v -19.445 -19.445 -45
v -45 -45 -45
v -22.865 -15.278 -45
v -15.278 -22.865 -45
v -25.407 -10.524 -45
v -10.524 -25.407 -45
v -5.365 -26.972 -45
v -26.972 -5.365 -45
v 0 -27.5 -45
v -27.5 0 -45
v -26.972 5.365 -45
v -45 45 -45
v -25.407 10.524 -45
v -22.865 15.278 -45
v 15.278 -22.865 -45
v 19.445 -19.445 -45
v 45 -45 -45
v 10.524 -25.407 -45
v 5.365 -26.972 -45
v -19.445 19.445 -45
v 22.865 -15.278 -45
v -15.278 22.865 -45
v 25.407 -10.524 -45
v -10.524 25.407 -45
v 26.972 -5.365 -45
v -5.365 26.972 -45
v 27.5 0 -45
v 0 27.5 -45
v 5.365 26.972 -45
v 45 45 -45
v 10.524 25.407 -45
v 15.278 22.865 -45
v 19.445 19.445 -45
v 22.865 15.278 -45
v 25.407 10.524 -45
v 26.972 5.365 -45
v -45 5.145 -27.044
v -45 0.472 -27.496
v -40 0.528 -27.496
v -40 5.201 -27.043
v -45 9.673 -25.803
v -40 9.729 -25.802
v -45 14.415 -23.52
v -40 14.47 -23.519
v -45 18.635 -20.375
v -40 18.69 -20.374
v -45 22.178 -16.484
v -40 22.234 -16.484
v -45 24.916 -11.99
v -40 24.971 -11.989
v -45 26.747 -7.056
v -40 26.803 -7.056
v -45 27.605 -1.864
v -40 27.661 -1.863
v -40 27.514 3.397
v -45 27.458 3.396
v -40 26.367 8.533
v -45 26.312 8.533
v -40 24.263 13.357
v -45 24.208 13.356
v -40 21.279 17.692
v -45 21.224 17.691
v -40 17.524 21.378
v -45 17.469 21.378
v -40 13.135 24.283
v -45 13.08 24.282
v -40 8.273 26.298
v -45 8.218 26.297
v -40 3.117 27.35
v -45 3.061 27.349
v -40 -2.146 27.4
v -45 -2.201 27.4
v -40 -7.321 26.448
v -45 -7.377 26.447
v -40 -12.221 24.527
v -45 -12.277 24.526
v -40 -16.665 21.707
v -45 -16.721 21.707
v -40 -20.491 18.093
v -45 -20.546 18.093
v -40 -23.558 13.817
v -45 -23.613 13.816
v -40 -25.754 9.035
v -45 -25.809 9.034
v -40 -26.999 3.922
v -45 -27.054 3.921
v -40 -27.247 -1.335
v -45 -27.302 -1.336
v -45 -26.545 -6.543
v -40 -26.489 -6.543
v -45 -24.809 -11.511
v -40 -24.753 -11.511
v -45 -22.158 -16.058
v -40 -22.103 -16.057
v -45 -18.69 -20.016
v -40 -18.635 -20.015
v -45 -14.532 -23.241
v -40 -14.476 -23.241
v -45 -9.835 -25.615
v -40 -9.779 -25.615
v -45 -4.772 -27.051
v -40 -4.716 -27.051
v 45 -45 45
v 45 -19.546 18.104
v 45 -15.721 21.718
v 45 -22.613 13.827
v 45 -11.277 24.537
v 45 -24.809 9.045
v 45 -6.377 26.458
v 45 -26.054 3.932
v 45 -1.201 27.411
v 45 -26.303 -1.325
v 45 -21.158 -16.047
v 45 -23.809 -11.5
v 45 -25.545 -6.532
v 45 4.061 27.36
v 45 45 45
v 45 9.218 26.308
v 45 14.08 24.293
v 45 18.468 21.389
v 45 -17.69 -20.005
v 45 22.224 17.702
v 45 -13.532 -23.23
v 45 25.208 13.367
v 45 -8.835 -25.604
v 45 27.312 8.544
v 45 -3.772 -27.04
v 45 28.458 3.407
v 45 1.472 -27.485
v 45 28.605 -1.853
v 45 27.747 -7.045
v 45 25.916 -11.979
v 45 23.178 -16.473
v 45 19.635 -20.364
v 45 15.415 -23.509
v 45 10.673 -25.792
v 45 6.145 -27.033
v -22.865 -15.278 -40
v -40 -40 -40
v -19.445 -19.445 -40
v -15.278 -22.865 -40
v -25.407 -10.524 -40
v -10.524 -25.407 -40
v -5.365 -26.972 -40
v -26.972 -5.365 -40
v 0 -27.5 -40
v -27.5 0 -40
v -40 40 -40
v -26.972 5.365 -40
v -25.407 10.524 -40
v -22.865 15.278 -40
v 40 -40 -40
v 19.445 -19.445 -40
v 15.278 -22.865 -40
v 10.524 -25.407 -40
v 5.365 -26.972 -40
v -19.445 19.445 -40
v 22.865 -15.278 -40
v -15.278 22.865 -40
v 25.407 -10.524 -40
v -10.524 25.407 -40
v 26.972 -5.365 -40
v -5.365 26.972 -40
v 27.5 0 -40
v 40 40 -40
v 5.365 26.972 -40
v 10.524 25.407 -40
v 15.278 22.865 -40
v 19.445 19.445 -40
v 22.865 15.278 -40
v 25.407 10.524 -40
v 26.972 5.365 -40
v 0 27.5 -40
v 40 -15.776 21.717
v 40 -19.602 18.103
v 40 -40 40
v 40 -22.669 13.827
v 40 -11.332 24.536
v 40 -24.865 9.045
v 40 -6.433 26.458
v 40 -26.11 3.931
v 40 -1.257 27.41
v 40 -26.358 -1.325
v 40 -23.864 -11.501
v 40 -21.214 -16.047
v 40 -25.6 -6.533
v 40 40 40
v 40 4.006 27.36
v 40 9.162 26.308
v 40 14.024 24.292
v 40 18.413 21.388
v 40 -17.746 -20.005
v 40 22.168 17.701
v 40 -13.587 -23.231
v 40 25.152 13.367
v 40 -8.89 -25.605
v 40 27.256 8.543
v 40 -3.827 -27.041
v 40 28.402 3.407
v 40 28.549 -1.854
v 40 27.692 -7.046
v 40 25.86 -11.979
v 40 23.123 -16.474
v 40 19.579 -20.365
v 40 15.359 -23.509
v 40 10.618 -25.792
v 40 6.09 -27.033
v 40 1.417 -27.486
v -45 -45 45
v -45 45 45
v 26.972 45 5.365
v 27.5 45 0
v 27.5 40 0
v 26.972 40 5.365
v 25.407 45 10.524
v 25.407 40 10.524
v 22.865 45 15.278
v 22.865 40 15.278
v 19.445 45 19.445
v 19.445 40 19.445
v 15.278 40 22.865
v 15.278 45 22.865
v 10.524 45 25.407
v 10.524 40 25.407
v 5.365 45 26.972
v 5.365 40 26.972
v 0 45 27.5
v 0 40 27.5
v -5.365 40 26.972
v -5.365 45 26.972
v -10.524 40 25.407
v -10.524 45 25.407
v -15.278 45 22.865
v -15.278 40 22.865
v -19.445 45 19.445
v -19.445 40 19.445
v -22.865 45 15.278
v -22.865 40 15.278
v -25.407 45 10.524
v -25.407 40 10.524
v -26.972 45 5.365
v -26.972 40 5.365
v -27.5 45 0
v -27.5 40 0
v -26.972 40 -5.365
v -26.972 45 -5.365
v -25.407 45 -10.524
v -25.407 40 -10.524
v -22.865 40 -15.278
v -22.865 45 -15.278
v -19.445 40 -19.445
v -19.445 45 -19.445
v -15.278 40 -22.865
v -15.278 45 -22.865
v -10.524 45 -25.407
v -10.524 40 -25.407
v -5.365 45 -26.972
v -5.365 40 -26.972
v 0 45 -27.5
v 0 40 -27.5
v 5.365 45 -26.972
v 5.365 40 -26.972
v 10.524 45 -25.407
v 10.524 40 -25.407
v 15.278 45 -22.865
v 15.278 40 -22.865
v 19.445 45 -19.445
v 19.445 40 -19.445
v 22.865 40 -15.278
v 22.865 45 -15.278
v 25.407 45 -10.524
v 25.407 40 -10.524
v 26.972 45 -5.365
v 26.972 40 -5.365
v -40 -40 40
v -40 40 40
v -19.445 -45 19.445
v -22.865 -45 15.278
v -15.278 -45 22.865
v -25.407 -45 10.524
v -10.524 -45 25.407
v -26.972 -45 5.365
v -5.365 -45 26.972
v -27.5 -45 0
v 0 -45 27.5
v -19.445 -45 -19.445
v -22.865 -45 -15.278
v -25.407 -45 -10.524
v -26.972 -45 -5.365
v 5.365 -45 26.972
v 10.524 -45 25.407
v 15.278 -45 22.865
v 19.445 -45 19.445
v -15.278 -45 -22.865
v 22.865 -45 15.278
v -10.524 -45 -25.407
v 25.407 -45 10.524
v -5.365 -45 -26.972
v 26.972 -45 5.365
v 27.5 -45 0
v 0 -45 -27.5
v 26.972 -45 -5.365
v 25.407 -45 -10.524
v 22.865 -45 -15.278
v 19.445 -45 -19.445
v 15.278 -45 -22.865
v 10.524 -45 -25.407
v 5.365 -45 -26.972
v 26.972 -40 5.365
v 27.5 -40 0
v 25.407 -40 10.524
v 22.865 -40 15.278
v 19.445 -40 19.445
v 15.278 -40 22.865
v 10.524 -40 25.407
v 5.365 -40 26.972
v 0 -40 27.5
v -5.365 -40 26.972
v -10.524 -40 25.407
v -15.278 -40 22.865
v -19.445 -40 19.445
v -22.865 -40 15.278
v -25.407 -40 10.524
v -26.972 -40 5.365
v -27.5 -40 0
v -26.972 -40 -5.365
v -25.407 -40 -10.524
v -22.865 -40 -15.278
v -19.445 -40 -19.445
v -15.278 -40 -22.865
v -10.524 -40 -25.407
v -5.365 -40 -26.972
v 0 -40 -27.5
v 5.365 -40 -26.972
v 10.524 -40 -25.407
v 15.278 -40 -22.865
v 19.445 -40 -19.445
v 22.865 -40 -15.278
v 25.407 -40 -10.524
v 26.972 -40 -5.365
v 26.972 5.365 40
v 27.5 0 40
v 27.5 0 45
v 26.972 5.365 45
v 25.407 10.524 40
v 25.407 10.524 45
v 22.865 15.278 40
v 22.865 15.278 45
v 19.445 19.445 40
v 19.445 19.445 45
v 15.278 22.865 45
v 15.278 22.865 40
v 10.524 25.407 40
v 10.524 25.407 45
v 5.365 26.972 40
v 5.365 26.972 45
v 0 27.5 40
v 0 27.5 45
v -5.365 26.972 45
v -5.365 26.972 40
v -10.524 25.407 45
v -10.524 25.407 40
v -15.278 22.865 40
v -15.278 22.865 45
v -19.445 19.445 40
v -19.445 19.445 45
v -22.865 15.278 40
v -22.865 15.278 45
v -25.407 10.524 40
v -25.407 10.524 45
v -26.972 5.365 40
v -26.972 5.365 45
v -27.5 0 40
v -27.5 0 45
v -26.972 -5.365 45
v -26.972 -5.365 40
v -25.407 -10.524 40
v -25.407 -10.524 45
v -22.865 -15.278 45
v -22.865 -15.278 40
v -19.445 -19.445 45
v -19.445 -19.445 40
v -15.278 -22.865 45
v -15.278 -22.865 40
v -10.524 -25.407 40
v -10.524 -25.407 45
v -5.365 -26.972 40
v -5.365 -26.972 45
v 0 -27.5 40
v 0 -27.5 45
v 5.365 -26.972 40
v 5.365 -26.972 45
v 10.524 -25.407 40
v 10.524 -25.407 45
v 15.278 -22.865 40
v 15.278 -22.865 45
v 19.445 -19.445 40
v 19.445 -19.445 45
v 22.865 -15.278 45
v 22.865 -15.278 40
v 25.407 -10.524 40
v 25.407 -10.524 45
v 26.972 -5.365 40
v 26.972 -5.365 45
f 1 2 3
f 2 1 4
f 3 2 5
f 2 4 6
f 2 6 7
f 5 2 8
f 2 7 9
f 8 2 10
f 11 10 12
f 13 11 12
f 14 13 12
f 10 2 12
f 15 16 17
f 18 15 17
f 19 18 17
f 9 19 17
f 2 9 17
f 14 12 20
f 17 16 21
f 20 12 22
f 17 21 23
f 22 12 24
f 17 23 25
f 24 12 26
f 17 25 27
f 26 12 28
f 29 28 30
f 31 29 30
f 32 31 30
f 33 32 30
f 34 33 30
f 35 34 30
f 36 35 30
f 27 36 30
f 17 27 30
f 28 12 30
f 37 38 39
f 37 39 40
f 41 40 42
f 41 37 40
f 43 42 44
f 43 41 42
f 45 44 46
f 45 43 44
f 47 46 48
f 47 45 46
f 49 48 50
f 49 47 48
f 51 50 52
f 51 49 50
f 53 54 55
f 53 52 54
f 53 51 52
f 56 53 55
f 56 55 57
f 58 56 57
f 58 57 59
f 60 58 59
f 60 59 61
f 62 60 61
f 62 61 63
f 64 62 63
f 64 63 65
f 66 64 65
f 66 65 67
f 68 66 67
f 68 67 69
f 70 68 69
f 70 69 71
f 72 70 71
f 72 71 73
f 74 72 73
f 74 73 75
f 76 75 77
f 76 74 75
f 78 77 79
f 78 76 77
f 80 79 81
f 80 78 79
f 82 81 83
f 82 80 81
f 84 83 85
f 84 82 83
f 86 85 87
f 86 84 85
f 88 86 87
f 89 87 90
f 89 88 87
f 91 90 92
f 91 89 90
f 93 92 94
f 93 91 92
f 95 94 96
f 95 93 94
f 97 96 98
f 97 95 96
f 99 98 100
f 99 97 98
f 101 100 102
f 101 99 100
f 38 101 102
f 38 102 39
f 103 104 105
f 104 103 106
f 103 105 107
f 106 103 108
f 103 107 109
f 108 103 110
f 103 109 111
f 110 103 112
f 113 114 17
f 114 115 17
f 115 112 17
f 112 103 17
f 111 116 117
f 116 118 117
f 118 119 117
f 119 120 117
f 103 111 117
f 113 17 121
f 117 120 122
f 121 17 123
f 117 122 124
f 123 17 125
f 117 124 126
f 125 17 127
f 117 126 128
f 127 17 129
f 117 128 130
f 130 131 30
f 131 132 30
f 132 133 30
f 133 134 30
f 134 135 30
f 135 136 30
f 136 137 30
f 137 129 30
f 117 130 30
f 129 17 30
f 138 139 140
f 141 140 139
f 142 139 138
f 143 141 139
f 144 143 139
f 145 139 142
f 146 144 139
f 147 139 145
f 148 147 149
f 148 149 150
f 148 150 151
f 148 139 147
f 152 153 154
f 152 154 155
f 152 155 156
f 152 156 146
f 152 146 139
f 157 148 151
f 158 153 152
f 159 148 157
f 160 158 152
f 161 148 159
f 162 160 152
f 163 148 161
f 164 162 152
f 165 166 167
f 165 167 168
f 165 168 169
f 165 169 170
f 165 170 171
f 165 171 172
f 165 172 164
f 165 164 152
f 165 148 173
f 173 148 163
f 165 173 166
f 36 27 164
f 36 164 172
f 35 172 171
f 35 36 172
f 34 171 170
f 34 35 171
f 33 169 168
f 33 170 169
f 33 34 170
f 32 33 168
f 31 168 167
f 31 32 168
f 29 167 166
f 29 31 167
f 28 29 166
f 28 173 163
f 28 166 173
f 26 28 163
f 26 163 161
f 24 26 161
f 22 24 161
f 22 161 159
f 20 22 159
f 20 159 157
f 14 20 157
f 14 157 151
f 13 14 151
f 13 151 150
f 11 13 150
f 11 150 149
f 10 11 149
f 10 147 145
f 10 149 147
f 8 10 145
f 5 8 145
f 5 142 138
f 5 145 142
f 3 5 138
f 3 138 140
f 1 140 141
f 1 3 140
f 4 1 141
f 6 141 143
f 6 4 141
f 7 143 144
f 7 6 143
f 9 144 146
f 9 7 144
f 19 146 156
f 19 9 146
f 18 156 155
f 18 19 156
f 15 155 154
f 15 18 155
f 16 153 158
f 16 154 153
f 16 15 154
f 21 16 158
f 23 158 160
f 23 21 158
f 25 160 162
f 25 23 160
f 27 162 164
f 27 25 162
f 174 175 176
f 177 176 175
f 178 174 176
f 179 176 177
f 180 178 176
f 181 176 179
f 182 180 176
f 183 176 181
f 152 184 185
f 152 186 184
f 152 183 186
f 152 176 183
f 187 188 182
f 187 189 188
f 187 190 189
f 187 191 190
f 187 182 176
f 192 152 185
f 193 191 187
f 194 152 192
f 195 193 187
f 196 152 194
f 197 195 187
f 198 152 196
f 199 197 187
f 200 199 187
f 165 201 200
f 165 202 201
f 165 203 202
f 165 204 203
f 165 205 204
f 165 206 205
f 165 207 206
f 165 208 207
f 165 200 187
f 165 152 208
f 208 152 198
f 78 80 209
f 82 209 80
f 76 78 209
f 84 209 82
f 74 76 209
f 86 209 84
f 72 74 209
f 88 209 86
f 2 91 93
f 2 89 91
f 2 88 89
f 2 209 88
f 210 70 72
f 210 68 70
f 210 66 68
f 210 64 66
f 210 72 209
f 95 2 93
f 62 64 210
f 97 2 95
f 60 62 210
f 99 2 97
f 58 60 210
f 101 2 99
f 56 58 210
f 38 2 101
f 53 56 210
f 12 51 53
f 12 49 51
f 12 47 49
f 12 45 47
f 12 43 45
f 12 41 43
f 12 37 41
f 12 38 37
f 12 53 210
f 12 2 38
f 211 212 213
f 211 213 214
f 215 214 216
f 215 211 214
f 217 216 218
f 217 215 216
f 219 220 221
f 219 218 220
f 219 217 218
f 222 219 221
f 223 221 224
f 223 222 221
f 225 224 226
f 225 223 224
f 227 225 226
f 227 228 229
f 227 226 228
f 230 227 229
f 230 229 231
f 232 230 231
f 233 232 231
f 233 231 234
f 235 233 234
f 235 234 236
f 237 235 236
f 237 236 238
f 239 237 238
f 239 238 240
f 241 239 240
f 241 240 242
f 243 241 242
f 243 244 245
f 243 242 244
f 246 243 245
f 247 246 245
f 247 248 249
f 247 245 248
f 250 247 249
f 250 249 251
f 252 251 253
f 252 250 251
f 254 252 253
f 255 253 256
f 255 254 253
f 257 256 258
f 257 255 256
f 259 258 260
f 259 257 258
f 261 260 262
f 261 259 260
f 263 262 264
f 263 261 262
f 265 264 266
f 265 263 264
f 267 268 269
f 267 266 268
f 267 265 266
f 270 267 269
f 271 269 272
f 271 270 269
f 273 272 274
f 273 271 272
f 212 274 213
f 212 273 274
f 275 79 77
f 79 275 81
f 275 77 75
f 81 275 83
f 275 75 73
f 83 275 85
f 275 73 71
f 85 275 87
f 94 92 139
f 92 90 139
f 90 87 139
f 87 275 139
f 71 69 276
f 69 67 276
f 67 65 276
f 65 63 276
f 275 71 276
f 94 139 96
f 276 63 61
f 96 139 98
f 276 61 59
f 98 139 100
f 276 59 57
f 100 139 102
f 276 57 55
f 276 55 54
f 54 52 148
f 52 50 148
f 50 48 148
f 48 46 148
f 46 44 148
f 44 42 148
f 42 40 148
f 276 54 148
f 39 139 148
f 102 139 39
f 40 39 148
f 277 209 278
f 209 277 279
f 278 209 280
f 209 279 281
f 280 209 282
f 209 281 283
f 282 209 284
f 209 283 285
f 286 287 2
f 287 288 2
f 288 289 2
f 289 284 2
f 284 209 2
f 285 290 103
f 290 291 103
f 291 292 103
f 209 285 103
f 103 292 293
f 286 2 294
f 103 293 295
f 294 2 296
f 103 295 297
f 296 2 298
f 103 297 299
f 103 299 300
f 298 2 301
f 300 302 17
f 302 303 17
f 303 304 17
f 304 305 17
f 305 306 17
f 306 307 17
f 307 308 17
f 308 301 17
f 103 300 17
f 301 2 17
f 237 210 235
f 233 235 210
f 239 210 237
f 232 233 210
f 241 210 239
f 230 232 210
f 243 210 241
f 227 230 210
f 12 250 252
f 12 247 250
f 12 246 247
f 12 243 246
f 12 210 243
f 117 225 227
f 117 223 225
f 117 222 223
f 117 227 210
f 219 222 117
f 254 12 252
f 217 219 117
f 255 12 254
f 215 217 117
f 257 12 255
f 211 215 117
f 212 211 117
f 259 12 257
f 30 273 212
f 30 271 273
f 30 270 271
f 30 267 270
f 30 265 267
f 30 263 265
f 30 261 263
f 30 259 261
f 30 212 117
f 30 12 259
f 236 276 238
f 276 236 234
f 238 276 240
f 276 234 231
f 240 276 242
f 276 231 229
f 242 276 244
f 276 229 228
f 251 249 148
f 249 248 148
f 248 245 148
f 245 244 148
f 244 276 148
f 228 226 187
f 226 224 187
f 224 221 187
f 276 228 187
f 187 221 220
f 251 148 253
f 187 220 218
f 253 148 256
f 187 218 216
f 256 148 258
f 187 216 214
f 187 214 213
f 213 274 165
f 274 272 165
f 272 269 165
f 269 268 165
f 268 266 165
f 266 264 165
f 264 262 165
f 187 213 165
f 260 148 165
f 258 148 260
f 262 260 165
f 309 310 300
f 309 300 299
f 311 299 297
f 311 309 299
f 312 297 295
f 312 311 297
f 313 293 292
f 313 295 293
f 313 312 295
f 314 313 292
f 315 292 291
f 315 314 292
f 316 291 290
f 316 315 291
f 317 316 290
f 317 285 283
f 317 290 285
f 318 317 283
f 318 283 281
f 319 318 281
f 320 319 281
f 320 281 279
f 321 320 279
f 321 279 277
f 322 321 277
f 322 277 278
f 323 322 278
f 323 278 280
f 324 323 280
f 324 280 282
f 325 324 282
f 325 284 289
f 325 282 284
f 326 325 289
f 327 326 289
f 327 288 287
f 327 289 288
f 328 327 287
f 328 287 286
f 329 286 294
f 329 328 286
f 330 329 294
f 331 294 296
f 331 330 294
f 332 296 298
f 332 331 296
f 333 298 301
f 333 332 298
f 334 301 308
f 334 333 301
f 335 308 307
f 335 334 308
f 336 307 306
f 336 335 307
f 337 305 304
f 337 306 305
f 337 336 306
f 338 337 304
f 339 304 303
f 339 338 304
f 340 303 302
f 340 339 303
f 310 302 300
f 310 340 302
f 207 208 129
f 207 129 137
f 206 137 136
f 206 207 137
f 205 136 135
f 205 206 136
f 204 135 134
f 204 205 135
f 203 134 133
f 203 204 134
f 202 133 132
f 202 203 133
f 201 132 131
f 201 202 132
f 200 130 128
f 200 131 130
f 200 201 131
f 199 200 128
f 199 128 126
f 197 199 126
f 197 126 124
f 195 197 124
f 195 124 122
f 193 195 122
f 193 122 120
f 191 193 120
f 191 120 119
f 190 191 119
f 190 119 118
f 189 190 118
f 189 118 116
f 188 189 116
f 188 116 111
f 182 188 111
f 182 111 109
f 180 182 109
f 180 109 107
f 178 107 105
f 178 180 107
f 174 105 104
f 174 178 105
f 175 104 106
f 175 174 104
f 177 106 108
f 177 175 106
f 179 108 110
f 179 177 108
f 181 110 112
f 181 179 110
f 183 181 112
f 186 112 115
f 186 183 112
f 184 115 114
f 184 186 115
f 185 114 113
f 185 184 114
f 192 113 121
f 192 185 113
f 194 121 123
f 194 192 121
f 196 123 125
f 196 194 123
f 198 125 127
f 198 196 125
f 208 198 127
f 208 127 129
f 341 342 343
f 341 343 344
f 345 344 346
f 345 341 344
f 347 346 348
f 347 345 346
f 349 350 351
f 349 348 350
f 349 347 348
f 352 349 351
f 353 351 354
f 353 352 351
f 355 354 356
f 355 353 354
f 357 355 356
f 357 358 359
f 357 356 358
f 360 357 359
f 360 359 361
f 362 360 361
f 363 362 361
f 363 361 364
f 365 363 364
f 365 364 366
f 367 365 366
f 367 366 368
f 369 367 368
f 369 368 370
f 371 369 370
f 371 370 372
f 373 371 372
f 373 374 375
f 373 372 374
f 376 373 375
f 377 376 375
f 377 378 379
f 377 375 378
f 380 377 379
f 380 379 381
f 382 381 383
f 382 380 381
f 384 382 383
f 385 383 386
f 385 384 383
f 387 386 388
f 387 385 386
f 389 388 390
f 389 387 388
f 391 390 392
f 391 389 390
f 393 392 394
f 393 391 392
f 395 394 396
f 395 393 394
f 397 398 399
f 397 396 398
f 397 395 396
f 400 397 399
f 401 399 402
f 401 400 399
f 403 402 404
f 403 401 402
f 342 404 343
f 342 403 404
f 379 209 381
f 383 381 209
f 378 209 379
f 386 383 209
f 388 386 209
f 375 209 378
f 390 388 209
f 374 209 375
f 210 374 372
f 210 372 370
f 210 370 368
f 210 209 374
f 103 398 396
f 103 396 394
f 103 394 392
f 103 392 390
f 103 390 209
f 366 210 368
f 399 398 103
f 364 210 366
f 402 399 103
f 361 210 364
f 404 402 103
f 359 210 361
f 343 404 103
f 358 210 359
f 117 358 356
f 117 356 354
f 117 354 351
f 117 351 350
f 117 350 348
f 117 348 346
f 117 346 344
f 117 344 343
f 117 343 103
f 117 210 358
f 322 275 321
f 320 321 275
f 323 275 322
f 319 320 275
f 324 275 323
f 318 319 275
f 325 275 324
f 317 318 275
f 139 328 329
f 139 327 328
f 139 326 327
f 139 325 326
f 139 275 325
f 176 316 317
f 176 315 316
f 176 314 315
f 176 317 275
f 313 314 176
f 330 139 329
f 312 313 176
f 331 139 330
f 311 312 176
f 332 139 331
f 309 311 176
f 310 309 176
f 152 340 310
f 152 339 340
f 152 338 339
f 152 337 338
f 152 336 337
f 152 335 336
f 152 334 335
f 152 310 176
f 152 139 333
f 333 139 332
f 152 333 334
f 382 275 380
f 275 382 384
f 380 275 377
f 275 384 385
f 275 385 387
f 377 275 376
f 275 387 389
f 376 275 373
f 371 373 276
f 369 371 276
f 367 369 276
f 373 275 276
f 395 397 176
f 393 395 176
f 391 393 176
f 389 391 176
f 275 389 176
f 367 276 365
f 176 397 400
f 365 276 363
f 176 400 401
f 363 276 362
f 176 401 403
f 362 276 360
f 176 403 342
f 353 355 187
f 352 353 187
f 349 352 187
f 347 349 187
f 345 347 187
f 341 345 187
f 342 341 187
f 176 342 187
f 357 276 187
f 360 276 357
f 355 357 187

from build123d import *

# Parameters (mm, degrees)
CYLINDER002_R               = 27.5
CYLINDER002_DEPTH           = 120
CYLINDER001_R               = 27.5
CYLINDER001_DEPTH           = 120
CYLINDER001_ROLL_ANGLE      = 89.363406
CYLINDER001_PITCH_ANGLE     = 89.363406
CYLINDER001_PLACEMENT_ANGLE = 90
CYLINDER_R                  = 27.5
CYLINDER_DEPTH              = 120
BOX001_W                    = 80
BOX001_H                    = 80
BOX001_DEPTH                = 80
BOX_W                       = 90
BOX_H                       = 90
BOX_DEPTH                   = 90


with BuildPart() as cylinder002:
    # Cylinder002 → Cylinder002 (new body)
    with BuildSketch(Plane.XZ.offset(-60)):
        Circle(CYLINDER002_R)
    extrude(amount=CYLINDER002_DEPTH)


with BuildPart() as cylinder001:
    # Cylinder001 → Cylinder001 (new body)
    with BuildSketch(Plane.XY):
        Circle(CYLINDER001_R)
    extrude(amount=CYLINDER001_DEPTH)


with BuildPart() as cylinder001_1:
    # Cylinder001 roll: moved
    add(cylinder001.part.rotate(Axis((0, 0, 0), (1, 0, 0)), CYLINDER001_ROLL_ANGLE))


with BuildPart() as cylinder001_2:
    # Cylinder001 pitch: moved
    add(cylinder001_1.part.rotate(Axis((0, 0, 0), (0, 1, 0)), CYLINDER001_PITCH_ANGLE))


with BuildPart() as cylinder001_3:
    # Cylinder001 placement: moved
    add(cylinder001_2.part.moved(Location((-60, 0, 0))).rotate(Axis((-60, 0, 0), (0, 0, 1)), CYLINDER001_PLACEMENT_ANGLE))


with BuildPart() as cylinder:
    # Cylinder → Cylinder (new body)
    with BuildSketch(Plane.XY.offset(-60)):
        Circle(CYLINDER_R)
    extrude(amount=CYLINDER_DEPTH)


with BuildPart() as cube001:
    # Box001 → Box001 (new body)
    with BuildSketch(Plane(origin=(-40, -40, -40), x_dir=(1, 0, 0), z_dir=(0, 0, 1))):
        with Locations((40, 40)):
            Rectangle(BOX001_W, BOX001_H)
    extrude(amount=BOX001_DEPTH)


with BuildPart() as cut003:
    # Box → Box (new body)
    with BuildSketch(Plane(origin=(-45, -45, -45), x_dir=(1, 0, 0), z_dir=(0, 0, 1))):
        with Locations((45, 45)):
            Rectangle(BOX_W, BOX_H)
    extrude(amount=BOX_DEPTH)

    # Cut: cut Cube001
    add(cube001.part, mode=Mode.SUBTRACT)

    # Cut001: cut Cylinder
    add(cylinder.part, mode=Mode.SUBTRACT)

    # Cut002: cut Cylinder001
    add(cylinder001_3.part, mode=Mode.SUBTRACT)

    # Cut003: cut Cylinder002
    add(cylinder002.part, mode=Mode.SUBTRACT)


solid = cut003.part
